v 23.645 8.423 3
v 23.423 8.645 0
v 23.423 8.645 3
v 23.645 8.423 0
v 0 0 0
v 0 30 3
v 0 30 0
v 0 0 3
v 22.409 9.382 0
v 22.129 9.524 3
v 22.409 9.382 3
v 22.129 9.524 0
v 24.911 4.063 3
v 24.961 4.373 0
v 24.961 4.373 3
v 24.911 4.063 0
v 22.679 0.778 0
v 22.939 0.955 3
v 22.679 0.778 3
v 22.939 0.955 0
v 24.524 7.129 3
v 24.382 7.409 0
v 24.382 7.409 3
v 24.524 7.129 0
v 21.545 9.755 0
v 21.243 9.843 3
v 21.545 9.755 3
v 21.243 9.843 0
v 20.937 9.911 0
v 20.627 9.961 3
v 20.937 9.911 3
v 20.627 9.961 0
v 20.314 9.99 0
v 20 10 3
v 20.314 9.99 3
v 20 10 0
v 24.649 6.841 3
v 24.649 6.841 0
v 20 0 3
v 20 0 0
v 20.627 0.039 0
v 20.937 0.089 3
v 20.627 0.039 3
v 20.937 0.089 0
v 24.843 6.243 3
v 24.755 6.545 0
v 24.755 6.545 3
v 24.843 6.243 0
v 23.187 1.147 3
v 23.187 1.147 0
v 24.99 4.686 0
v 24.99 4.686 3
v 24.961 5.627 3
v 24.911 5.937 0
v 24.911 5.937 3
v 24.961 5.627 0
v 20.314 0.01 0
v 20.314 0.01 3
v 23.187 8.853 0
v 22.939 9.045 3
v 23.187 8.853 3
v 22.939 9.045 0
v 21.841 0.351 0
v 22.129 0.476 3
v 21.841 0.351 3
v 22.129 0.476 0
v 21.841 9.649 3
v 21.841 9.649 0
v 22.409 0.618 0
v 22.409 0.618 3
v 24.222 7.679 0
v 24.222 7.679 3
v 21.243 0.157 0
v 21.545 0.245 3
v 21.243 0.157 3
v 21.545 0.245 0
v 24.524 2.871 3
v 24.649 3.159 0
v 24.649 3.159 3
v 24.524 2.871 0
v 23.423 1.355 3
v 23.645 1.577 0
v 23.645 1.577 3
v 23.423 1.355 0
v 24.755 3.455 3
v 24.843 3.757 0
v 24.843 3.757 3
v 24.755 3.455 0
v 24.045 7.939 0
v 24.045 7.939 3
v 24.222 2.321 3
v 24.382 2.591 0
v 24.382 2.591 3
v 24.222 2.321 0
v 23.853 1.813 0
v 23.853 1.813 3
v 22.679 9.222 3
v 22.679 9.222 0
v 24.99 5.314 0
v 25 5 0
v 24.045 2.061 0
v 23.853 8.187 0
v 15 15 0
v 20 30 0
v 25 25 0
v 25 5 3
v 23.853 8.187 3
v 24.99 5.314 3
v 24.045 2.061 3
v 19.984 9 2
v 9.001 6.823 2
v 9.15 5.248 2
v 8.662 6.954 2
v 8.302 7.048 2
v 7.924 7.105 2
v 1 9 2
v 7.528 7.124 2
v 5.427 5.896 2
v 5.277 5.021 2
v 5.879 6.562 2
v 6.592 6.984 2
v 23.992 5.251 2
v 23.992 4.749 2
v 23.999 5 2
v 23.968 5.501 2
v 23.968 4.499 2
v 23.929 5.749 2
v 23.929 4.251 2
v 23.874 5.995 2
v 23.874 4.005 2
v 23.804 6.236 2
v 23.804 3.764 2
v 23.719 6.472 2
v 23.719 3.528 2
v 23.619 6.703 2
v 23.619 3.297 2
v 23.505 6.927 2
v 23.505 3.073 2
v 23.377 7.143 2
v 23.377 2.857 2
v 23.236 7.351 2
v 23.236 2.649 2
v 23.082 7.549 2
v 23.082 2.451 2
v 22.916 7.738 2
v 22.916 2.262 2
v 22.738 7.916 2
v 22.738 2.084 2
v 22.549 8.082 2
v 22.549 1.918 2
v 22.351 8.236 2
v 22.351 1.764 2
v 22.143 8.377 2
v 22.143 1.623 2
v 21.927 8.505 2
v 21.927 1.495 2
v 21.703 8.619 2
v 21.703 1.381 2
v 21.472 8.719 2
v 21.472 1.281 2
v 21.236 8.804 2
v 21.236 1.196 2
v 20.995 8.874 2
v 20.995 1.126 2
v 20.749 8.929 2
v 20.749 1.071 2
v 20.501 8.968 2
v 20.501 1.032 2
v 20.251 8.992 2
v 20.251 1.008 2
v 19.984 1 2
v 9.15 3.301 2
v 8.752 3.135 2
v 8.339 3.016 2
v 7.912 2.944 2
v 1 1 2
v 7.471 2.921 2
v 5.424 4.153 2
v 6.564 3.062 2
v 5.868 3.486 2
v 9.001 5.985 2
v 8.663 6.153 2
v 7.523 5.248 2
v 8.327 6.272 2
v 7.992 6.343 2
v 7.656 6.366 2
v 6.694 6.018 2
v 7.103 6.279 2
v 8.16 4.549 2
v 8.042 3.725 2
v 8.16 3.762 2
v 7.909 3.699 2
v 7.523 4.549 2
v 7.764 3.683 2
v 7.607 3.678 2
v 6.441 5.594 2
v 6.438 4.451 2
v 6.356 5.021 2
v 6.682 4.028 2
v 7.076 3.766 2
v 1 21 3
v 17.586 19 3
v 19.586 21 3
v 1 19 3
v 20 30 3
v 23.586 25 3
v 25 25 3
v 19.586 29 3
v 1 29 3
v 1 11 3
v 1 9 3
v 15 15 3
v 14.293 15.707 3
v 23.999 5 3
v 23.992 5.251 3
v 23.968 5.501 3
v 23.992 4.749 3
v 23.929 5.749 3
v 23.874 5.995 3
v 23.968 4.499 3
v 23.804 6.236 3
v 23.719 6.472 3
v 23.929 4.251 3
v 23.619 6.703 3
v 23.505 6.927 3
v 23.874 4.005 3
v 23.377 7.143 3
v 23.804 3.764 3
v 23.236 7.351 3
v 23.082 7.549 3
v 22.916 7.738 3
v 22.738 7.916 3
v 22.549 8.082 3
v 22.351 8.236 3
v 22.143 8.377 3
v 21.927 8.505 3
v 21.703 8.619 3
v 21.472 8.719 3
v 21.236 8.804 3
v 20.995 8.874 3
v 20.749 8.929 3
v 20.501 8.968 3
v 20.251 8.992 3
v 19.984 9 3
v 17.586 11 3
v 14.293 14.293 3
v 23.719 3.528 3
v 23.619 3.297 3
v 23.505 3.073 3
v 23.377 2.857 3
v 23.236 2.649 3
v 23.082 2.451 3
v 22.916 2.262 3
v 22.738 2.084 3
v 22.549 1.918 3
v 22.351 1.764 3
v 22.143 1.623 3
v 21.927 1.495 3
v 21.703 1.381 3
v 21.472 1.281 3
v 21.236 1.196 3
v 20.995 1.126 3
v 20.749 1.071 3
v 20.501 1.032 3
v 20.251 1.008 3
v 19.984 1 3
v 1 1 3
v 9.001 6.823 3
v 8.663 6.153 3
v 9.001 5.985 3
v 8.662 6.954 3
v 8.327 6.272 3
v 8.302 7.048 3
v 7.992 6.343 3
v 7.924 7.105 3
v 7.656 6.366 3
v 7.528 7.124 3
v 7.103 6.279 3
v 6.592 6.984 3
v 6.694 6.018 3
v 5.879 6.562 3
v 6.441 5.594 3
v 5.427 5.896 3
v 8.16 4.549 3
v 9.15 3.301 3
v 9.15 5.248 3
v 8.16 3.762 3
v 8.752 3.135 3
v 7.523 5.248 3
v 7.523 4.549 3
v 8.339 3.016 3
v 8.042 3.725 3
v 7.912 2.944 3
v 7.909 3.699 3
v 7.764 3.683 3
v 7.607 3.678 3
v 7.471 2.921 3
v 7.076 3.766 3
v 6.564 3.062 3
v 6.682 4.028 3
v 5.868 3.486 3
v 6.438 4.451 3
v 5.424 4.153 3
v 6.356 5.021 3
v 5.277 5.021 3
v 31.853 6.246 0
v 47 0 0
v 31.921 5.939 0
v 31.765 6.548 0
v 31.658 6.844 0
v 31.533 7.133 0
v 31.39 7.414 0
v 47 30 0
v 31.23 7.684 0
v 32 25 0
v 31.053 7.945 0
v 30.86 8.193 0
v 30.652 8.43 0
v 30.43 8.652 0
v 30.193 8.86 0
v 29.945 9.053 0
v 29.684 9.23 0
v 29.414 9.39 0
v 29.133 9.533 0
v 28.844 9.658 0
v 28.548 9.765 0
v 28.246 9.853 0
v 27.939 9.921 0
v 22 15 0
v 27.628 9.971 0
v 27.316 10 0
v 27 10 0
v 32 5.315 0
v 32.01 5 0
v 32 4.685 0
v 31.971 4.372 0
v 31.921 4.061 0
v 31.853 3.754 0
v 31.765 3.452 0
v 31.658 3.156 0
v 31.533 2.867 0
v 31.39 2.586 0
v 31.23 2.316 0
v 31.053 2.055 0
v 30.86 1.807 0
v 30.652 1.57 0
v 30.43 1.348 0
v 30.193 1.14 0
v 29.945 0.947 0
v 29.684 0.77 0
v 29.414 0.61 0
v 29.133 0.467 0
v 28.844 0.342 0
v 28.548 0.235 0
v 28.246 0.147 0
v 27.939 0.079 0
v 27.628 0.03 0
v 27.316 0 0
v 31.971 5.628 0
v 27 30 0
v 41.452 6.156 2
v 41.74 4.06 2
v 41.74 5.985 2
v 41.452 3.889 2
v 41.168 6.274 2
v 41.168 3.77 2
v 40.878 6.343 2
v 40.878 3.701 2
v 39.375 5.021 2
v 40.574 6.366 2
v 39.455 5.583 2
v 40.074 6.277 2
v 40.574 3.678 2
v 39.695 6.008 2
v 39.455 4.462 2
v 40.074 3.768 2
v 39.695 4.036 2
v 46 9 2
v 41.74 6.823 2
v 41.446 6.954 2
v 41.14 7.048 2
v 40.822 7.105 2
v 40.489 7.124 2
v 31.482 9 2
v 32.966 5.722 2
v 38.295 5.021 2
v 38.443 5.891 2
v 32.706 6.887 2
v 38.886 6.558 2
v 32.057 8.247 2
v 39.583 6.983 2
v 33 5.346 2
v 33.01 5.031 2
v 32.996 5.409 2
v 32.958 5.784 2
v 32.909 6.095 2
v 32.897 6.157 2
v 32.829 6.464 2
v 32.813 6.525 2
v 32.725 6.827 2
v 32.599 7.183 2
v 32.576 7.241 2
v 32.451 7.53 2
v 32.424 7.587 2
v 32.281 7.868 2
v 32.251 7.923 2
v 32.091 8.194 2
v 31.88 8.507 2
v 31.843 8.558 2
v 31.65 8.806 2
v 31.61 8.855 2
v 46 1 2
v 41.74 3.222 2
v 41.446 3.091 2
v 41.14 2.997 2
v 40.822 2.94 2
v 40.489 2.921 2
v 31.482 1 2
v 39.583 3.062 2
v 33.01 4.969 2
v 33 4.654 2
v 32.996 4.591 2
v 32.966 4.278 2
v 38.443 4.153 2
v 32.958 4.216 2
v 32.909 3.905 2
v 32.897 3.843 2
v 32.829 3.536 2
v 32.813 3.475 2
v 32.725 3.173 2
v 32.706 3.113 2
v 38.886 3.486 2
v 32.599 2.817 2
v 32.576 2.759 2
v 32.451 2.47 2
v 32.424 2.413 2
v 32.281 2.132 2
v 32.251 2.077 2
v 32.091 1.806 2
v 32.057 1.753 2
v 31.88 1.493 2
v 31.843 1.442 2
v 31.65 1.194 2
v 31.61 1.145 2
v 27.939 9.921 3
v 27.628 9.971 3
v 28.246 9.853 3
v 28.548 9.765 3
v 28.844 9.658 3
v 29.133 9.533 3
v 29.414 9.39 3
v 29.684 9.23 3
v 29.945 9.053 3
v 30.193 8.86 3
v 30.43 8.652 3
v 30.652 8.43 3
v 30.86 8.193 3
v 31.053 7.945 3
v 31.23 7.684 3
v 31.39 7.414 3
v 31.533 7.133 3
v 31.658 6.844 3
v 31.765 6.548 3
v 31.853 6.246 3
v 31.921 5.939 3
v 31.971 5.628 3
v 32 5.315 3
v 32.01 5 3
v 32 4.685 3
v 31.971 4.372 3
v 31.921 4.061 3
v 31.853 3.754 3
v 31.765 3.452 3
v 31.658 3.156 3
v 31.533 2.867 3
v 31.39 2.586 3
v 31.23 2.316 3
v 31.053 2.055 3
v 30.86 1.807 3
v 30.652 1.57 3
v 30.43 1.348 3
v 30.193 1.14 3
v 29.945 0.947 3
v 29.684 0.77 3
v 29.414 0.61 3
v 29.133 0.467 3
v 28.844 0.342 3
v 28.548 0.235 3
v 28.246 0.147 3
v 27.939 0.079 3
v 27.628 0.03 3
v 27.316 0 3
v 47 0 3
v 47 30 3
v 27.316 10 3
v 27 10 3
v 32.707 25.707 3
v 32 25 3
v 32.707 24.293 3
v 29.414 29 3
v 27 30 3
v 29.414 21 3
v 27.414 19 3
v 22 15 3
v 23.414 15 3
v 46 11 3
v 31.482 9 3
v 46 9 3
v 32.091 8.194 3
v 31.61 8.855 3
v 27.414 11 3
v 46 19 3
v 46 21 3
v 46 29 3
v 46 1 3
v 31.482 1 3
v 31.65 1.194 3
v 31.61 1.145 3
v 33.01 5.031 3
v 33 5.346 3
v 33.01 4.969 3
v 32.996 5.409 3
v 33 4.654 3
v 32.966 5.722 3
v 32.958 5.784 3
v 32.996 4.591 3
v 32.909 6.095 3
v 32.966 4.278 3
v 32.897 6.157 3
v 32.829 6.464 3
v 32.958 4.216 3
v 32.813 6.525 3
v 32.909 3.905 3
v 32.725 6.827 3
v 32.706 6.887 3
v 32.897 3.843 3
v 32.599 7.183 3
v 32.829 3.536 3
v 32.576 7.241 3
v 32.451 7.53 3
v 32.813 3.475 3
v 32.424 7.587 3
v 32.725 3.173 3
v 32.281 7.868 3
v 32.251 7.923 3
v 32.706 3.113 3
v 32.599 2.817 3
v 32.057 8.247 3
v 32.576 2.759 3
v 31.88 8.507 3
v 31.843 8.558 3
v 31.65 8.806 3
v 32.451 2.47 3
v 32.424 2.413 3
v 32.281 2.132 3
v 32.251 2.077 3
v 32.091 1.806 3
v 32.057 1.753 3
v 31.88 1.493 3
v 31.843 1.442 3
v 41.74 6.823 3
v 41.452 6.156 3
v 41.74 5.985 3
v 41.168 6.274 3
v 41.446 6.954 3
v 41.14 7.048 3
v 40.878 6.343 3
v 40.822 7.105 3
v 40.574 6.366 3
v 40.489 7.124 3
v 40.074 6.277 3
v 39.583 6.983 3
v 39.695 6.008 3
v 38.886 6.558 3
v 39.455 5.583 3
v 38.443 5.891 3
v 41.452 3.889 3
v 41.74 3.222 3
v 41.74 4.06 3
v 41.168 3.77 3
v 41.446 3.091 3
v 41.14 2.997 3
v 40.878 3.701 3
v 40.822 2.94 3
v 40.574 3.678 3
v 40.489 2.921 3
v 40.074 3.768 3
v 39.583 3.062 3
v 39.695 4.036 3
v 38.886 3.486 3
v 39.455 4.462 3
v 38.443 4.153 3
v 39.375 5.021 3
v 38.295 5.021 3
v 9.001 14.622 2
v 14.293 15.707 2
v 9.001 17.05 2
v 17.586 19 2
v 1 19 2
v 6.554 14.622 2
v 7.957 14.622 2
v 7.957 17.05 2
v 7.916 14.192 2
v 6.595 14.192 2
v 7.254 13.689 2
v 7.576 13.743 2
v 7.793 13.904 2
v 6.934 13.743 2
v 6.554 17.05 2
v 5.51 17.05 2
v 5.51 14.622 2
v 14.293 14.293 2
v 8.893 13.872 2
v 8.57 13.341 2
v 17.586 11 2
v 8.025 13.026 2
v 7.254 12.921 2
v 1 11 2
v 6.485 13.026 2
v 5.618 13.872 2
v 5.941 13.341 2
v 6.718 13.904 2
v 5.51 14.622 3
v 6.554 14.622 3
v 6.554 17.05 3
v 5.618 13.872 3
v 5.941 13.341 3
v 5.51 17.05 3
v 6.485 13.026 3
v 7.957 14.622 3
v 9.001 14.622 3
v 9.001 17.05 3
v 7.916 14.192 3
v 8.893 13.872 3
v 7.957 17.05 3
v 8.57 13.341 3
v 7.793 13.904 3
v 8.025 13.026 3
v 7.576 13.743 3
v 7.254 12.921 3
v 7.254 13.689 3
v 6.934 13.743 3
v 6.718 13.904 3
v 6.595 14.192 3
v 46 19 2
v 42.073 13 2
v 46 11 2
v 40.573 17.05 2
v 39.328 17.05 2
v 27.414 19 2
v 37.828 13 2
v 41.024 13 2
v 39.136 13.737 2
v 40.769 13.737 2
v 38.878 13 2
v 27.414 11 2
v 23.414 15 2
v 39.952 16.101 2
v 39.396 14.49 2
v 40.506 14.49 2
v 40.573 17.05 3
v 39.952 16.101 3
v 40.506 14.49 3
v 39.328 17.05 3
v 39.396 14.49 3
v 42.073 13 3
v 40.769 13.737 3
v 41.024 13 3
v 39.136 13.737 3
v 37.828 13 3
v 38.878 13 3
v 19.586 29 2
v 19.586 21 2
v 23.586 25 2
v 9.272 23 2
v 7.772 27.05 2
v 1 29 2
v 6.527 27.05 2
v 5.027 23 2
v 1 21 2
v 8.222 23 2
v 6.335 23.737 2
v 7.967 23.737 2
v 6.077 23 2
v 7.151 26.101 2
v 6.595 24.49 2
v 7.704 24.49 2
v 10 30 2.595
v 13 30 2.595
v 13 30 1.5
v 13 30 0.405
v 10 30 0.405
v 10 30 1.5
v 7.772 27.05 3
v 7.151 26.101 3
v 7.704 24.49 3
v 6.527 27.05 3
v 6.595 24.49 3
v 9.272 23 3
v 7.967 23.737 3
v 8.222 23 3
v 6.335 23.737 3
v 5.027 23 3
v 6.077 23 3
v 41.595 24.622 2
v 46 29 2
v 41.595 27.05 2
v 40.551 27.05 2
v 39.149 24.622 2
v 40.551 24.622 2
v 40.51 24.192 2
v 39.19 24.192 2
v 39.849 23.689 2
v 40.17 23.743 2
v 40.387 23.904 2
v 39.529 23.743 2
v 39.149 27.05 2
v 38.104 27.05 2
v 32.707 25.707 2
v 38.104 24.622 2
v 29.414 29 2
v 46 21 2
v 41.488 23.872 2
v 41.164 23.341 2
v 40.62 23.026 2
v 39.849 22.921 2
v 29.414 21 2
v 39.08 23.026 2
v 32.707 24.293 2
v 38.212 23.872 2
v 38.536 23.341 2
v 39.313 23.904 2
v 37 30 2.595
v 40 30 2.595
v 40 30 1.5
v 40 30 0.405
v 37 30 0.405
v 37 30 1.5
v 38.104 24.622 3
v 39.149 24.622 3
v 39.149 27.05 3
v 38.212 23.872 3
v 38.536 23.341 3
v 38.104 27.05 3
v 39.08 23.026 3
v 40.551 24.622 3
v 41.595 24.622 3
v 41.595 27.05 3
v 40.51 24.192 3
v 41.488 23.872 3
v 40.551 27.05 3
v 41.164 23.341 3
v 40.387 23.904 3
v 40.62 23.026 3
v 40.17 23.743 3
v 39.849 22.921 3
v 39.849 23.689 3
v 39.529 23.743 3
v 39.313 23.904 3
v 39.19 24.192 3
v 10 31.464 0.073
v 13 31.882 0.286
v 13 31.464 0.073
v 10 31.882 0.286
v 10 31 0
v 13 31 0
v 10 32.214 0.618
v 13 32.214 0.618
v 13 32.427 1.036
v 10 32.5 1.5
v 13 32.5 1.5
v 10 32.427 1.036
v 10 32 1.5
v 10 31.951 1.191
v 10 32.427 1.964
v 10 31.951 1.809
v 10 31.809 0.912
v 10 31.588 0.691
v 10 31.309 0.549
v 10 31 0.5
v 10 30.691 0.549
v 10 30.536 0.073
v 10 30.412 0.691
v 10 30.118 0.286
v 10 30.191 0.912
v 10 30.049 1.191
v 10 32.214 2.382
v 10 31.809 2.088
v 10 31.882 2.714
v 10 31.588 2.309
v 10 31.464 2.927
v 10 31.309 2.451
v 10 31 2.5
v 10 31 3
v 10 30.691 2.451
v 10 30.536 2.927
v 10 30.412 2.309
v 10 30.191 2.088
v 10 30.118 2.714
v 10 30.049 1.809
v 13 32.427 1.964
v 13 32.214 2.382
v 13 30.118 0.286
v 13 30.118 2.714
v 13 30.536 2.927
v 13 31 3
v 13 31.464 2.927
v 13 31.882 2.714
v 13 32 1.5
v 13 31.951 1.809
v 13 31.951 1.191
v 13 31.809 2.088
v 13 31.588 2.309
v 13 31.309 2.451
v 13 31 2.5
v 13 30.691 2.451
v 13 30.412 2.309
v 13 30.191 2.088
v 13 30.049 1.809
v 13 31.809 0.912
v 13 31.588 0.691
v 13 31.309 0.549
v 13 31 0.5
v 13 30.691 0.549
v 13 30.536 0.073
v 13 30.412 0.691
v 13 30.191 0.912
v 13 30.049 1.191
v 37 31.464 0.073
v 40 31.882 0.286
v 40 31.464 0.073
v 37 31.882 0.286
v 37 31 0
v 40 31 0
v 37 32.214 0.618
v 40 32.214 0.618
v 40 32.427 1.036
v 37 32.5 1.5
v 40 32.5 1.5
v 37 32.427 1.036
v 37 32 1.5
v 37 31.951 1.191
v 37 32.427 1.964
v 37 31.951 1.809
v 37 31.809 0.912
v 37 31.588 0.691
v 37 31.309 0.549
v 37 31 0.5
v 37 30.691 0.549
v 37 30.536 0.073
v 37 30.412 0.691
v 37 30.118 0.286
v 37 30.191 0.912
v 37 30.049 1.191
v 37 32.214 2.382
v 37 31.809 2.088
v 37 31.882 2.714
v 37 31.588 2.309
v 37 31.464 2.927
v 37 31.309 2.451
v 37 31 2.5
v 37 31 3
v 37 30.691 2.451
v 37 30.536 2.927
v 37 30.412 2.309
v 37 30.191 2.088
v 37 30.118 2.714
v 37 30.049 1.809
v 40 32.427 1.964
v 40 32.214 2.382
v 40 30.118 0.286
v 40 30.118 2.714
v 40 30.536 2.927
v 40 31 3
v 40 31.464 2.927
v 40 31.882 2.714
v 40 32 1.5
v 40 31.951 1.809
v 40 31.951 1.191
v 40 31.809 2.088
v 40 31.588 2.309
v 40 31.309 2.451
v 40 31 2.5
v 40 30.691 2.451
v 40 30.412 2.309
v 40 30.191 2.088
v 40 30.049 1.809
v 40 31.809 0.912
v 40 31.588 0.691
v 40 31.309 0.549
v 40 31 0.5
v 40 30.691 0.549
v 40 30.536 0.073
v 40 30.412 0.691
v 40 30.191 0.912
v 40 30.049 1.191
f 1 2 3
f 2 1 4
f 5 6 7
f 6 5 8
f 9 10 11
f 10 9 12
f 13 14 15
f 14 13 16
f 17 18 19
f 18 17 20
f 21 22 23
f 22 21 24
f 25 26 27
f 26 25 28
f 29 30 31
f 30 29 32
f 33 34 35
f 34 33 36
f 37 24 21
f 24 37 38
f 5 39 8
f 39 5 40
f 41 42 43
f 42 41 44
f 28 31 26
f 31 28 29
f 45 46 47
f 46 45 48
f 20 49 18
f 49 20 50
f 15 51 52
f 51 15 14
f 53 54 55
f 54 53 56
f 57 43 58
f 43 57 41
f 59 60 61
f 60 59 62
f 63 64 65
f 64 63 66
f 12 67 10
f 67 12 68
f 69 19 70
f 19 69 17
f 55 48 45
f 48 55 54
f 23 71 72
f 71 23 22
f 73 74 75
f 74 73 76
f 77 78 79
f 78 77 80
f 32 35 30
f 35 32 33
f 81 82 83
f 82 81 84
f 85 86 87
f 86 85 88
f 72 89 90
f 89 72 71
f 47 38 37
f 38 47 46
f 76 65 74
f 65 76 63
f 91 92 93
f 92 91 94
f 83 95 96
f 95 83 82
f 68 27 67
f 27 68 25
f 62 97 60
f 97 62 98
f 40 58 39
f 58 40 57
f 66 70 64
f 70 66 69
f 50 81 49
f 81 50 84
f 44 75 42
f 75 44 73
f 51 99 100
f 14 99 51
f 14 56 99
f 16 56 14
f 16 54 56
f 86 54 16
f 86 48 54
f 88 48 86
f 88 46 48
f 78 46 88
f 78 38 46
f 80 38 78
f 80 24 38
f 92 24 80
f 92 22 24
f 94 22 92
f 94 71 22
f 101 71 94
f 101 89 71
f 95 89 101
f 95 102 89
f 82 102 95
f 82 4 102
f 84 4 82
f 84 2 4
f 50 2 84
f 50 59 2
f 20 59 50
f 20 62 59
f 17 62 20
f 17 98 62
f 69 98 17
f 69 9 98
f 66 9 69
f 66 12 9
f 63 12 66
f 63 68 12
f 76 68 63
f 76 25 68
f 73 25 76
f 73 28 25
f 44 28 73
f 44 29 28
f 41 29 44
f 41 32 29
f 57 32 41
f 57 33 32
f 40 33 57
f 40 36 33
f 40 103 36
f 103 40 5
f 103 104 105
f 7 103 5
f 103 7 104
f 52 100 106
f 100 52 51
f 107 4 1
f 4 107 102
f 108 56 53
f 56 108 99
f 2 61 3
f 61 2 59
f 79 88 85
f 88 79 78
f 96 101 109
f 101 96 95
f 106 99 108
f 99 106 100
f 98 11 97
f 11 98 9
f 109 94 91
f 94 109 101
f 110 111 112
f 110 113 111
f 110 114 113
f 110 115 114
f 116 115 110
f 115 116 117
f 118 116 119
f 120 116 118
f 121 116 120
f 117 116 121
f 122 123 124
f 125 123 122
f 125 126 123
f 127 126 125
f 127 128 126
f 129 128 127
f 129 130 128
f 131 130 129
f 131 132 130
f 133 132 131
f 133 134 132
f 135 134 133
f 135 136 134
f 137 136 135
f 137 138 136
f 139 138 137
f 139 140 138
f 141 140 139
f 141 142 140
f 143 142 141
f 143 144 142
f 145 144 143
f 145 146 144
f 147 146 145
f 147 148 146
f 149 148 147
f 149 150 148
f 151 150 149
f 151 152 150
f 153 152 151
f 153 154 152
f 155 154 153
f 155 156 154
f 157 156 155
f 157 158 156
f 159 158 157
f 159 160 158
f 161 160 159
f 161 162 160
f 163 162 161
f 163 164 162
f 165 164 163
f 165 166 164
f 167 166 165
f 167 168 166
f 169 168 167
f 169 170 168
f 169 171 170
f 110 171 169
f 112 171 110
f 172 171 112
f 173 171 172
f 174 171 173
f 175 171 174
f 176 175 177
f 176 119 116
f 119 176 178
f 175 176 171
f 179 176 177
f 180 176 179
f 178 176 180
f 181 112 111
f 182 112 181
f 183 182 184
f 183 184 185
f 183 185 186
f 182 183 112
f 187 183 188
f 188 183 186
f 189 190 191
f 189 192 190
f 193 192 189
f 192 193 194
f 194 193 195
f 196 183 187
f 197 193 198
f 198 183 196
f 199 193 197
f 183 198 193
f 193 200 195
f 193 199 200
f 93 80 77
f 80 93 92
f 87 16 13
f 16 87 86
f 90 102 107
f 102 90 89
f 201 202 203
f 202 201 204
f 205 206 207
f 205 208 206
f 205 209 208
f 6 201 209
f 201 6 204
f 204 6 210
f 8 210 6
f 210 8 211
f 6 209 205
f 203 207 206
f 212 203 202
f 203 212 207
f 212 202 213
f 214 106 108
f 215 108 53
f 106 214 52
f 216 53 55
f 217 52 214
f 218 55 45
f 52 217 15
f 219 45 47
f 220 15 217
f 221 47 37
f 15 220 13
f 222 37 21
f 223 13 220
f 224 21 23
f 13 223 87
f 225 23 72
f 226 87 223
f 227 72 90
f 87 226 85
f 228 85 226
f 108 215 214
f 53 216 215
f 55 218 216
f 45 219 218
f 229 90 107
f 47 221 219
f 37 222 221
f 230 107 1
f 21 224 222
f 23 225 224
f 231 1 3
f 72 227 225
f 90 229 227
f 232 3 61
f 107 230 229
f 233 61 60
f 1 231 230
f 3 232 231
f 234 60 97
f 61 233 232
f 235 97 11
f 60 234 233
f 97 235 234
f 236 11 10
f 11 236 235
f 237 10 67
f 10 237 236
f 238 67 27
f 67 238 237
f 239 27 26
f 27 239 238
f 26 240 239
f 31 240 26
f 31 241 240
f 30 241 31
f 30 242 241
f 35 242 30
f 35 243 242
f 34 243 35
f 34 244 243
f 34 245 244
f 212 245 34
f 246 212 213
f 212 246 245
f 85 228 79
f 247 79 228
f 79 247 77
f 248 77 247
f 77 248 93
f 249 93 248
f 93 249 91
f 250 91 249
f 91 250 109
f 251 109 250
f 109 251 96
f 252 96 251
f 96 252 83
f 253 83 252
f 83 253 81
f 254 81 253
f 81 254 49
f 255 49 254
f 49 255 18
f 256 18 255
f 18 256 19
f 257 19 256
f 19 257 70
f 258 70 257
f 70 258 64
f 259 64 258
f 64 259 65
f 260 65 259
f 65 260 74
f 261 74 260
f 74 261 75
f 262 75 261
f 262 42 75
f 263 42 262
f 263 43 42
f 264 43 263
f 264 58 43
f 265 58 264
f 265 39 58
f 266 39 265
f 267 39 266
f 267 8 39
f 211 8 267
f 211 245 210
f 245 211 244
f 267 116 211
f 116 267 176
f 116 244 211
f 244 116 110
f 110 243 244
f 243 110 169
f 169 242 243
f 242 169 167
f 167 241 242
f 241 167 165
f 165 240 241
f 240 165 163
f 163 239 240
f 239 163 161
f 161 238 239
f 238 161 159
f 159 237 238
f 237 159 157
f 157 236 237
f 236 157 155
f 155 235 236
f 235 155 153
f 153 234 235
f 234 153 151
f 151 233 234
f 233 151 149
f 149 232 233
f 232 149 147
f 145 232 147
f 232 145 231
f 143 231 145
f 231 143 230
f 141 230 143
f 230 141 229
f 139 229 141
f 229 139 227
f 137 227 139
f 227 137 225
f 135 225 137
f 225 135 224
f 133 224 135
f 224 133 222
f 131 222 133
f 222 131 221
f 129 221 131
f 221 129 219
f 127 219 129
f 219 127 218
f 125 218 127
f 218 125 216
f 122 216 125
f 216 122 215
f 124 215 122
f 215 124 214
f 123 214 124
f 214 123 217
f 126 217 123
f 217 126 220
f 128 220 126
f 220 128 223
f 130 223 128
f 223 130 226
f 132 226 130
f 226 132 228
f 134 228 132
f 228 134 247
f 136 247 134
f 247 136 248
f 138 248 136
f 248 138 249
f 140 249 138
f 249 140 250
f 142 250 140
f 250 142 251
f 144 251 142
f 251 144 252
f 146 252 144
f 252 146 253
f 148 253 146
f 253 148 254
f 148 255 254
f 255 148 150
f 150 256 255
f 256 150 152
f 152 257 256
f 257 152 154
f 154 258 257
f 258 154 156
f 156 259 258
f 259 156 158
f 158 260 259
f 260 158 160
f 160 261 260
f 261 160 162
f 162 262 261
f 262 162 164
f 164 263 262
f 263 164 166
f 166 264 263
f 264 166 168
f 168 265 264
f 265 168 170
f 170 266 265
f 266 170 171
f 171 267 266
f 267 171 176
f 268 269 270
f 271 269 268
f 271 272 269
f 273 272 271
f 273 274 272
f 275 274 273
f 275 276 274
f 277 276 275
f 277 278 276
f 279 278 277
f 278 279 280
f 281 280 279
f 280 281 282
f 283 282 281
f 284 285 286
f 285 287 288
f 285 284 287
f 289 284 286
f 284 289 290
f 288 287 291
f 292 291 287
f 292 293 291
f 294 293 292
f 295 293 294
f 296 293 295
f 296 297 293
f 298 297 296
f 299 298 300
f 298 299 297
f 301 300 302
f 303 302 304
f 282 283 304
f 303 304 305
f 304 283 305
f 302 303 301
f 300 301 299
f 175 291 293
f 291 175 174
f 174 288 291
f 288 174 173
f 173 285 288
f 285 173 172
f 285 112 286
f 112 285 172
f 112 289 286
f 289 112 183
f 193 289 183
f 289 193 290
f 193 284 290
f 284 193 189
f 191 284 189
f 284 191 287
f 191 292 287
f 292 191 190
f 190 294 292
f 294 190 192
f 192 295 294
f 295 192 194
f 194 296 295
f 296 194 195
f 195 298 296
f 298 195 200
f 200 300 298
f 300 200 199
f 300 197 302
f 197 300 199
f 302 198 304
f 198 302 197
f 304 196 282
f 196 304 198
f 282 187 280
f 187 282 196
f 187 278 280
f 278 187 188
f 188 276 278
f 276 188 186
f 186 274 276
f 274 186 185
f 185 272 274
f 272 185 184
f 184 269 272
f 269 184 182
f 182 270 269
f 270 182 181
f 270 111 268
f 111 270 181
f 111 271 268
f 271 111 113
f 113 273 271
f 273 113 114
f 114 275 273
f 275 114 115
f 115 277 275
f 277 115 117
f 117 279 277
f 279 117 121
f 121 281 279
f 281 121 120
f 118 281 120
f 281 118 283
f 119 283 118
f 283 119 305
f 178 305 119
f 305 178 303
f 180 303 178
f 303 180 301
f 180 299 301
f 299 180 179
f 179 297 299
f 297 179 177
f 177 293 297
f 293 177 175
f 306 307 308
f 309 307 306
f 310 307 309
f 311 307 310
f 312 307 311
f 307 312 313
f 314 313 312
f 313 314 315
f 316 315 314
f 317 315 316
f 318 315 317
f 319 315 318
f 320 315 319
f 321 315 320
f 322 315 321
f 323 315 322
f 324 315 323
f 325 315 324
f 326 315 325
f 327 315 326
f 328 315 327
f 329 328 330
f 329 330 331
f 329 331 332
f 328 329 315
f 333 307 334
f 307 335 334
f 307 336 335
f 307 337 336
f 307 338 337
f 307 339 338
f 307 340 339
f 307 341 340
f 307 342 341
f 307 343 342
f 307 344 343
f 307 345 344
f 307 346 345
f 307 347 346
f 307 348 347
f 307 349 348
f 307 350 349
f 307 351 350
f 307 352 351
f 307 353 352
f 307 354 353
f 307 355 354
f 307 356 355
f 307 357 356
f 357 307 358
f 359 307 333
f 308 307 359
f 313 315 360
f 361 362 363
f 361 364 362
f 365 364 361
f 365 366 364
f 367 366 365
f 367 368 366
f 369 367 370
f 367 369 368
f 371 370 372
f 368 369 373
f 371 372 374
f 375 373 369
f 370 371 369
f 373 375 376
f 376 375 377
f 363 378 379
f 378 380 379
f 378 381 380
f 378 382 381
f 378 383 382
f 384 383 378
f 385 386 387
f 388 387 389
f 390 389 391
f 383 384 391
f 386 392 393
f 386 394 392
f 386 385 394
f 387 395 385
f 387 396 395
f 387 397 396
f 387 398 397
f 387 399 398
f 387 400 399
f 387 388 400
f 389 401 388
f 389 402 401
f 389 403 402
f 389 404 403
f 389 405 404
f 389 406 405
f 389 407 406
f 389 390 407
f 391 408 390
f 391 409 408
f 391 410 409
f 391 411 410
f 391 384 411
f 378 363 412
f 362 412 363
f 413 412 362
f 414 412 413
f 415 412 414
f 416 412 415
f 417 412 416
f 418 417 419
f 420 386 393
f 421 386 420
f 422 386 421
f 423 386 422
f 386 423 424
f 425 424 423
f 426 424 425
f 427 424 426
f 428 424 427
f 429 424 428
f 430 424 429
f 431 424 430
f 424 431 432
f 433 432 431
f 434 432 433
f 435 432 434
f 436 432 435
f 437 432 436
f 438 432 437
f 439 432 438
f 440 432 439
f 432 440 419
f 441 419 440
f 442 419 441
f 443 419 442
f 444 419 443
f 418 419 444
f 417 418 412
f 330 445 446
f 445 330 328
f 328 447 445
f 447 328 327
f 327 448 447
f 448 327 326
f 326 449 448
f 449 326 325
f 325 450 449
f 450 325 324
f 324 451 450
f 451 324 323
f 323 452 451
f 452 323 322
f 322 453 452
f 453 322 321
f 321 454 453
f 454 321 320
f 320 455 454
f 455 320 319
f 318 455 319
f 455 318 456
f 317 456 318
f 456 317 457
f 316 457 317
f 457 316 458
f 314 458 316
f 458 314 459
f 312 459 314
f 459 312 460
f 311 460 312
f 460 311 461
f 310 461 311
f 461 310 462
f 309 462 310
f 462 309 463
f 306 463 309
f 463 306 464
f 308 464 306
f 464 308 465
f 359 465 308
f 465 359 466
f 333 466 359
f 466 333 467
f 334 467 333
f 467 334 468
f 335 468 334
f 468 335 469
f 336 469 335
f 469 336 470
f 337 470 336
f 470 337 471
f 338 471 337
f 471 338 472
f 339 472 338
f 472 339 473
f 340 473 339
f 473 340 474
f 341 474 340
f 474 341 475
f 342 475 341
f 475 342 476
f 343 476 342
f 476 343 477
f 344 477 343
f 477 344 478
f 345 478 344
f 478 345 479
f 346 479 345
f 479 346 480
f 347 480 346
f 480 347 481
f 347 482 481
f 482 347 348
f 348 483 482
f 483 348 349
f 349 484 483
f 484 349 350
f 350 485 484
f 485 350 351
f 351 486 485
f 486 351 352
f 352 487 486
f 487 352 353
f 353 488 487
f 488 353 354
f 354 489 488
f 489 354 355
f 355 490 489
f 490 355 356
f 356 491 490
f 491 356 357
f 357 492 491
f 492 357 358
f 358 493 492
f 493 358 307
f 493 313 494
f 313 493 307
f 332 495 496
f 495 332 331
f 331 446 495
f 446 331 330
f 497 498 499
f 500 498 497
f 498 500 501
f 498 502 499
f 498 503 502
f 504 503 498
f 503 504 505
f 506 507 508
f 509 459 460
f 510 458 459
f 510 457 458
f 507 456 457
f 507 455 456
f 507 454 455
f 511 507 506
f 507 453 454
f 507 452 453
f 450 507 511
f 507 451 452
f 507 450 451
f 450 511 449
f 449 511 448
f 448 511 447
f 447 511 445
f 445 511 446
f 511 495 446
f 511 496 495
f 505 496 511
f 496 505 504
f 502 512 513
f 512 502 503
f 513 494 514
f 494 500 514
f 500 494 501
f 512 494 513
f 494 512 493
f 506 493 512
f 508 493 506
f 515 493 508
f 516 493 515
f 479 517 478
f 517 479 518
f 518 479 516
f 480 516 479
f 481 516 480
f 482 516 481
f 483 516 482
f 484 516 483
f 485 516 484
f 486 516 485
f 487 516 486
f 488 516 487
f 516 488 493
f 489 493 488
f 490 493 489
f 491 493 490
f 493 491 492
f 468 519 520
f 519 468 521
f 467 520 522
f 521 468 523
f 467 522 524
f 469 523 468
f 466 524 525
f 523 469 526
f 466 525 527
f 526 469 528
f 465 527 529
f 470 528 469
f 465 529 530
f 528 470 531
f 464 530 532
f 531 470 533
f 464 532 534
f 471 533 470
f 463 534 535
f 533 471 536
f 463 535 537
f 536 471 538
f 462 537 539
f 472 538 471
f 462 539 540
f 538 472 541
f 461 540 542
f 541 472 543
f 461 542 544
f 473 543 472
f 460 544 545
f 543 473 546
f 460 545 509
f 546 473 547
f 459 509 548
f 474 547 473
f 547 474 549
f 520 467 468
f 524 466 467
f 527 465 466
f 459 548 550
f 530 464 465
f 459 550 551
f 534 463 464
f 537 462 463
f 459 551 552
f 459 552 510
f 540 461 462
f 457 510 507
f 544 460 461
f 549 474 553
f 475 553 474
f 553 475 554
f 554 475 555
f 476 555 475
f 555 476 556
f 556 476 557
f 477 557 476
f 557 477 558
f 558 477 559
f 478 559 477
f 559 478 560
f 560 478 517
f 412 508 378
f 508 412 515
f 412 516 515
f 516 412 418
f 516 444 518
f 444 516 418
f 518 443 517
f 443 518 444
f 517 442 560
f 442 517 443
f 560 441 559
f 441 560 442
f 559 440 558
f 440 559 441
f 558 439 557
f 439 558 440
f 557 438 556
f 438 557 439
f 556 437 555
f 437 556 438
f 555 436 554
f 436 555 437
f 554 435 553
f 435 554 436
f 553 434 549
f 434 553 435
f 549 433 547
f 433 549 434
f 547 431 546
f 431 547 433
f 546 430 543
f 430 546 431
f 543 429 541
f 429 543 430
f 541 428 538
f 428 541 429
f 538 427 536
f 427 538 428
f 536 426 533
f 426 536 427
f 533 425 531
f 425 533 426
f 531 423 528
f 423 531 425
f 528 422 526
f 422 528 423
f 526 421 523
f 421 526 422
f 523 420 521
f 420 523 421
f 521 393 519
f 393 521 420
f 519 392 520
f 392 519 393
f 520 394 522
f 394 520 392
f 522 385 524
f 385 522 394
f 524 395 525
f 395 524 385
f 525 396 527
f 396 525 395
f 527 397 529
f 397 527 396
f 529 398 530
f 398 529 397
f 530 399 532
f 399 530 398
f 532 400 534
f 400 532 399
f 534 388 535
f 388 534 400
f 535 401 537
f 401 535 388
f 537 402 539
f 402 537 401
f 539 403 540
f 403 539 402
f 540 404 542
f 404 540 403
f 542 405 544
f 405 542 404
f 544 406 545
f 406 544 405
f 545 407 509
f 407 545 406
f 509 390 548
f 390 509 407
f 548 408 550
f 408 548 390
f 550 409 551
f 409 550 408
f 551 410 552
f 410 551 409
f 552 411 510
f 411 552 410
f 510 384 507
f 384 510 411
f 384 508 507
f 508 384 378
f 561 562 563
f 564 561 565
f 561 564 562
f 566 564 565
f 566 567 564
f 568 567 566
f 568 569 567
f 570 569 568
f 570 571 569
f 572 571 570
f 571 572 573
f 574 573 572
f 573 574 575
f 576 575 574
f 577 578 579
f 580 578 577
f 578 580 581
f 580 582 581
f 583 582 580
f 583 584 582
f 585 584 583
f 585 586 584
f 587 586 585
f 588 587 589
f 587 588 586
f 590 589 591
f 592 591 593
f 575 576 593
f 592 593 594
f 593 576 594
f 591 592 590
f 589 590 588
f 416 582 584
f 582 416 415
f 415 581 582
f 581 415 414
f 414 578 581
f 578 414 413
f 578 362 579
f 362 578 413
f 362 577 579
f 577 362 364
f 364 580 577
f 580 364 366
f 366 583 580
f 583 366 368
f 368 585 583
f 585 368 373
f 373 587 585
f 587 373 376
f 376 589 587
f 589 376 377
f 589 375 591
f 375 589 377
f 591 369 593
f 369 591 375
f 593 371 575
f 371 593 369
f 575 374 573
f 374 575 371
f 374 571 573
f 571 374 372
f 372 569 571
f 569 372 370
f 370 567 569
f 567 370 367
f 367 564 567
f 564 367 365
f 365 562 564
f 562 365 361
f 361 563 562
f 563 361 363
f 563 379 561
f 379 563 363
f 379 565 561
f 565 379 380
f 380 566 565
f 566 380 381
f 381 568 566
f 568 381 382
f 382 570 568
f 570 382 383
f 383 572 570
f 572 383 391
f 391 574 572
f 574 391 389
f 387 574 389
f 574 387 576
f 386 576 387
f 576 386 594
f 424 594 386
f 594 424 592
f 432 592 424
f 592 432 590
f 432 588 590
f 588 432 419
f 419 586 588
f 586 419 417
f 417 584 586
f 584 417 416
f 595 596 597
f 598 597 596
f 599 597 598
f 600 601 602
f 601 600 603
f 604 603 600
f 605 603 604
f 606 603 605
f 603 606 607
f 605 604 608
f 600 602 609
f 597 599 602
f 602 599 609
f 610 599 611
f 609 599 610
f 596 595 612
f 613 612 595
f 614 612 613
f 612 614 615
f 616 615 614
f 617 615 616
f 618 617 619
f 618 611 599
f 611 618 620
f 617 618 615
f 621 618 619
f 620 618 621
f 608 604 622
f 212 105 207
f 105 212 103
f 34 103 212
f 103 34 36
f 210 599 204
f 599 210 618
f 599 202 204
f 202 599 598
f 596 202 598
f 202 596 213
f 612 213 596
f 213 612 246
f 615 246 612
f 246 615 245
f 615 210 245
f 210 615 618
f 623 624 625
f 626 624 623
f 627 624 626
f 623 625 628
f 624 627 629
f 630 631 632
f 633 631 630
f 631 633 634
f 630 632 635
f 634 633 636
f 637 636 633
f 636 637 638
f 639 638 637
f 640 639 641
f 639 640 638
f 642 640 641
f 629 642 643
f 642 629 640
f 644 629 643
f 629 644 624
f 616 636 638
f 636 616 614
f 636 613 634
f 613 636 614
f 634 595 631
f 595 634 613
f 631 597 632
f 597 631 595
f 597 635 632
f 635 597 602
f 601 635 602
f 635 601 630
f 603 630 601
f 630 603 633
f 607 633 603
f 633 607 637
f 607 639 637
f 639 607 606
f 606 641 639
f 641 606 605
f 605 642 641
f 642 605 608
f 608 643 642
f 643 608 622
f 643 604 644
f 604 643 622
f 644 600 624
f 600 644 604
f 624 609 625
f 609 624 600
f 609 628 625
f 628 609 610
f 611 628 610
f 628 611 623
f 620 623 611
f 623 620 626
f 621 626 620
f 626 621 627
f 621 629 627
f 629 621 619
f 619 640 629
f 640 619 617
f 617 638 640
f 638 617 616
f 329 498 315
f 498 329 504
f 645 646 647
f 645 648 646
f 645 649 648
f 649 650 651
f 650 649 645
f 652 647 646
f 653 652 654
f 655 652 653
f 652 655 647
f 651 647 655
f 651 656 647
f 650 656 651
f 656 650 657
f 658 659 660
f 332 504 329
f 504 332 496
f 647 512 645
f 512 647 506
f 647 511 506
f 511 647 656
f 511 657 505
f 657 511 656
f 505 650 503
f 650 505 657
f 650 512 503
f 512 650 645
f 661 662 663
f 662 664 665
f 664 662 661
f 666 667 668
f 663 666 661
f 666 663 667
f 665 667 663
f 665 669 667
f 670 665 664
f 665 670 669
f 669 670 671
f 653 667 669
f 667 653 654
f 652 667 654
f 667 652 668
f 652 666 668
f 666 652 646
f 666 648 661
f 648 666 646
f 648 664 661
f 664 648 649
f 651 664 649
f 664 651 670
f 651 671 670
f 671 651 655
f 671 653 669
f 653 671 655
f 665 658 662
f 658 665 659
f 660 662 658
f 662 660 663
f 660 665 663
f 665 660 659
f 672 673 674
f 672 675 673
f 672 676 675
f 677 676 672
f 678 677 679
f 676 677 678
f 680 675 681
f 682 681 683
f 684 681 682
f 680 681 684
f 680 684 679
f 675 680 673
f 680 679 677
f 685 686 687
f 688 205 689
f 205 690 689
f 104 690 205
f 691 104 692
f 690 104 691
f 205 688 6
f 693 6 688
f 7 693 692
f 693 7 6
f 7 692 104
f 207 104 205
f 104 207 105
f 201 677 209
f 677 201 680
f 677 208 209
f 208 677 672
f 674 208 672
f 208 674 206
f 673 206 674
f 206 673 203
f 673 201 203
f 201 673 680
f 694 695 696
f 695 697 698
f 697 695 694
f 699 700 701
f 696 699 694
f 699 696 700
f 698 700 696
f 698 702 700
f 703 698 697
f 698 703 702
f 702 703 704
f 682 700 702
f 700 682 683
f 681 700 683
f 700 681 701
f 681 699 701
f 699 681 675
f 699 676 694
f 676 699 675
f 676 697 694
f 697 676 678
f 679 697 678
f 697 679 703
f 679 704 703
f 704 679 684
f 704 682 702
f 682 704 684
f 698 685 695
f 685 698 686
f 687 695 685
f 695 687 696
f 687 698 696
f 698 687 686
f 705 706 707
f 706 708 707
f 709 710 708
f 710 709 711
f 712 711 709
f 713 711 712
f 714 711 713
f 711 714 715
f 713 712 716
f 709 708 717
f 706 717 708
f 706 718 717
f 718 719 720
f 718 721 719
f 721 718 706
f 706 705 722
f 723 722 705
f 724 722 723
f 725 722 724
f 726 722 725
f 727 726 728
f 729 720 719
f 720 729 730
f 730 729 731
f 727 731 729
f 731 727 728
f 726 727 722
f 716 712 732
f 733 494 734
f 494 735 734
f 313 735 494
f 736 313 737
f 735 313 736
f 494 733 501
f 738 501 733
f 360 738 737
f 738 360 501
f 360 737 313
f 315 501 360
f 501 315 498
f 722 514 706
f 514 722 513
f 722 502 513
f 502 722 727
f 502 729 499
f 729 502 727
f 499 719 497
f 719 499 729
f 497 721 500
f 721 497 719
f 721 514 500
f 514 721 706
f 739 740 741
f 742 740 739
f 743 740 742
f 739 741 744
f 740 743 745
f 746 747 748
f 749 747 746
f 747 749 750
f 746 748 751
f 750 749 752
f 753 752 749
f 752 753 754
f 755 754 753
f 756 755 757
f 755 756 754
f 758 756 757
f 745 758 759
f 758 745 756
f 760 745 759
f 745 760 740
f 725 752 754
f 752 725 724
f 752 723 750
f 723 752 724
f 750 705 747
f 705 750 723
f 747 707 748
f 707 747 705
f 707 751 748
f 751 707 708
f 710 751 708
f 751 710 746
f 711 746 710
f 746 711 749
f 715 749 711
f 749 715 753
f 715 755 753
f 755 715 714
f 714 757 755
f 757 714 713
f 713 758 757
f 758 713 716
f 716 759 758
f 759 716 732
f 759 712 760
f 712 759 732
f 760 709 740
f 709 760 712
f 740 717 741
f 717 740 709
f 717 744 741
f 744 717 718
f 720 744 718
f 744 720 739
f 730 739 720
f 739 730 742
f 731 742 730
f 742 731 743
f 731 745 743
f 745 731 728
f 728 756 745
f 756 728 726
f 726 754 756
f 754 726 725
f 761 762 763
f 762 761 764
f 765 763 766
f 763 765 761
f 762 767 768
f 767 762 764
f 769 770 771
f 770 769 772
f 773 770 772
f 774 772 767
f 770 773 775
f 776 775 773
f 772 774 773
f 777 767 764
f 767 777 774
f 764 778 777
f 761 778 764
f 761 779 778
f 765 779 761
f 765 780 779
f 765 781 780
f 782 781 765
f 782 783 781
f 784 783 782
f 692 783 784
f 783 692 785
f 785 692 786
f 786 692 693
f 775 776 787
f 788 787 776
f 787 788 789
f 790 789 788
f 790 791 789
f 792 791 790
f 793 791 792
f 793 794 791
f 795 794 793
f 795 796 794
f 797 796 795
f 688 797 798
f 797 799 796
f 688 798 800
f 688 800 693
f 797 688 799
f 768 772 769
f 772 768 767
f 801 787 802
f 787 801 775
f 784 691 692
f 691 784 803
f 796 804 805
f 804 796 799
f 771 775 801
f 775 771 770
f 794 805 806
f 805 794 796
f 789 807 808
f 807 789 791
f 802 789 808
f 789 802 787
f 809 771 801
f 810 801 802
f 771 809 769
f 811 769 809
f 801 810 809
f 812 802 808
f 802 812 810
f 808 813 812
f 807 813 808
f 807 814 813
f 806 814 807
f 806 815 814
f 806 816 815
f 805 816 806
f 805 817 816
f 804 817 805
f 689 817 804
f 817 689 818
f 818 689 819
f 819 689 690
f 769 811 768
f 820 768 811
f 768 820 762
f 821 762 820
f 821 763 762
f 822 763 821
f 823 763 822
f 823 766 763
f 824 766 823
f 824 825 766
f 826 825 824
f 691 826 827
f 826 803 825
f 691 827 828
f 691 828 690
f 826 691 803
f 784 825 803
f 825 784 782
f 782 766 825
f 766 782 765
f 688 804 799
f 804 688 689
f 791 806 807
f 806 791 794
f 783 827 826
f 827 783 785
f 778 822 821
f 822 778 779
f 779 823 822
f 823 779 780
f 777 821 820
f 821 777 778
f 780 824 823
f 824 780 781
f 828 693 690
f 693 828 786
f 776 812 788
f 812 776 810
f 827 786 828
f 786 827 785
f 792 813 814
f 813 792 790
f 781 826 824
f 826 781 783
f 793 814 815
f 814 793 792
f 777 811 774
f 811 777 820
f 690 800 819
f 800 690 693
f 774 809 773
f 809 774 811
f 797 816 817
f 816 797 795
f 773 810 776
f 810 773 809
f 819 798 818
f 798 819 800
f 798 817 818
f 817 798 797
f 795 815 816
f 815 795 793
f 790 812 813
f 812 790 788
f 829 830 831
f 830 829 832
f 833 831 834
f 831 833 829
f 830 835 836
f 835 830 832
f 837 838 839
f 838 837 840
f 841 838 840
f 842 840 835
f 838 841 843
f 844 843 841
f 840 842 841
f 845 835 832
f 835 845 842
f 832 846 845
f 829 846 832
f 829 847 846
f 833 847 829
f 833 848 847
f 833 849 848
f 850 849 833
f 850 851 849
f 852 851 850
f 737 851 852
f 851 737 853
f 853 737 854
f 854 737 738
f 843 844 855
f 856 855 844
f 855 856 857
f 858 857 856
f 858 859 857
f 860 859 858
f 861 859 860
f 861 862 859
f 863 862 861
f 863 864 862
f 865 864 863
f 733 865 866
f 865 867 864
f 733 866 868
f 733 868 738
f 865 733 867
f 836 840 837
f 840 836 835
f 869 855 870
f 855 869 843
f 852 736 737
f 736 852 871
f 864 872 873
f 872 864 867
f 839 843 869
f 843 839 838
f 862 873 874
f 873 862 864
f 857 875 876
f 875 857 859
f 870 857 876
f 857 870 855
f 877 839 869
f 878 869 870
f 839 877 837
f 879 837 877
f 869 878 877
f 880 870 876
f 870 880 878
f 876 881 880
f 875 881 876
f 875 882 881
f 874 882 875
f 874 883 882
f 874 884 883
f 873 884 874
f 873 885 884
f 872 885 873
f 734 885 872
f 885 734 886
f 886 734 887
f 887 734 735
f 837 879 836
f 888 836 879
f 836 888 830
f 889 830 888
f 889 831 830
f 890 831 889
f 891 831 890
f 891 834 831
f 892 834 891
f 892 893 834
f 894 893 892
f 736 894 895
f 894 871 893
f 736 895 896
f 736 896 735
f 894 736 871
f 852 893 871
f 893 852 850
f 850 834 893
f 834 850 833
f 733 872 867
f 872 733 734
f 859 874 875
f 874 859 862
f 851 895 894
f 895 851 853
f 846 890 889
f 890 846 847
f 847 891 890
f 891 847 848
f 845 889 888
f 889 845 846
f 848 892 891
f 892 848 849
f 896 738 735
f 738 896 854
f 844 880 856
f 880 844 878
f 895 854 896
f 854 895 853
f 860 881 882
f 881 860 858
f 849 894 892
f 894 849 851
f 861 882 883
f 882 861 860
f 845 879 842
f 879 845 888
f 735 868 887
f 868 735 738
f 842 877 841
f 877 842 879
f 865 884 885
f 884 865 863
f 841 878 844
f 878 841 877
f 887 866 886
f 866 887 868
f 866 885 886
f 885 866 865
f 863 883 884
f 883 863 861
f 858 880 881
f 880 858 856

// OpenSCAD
width = 20;
height = 10;
extrusion = height / 2;
separation = 7;
textHeightCoeff = .4;
textXoffset = 5;
radiusFudge = 0.01;


//https://gist.github.com/Stemer114/7e420ea8ad9733c4e0ba
module ring(
        h=1,
        od = 10,
        id = 5,
        de = 0.1
        ) 
{
    difference() {
        cylinder(h=h, r=od/2, $fn=20);
        translate([0, 0, -de])
            cylinder(h=h+2*de, r=id/2, $fn=20);
    }
}


module drawLabel(x, y, isRotated, string){
    offsetY = (height * (1 - textHeightCoeff) / 2);
    linear_extrude(3){
        translate([x + (isRotated ? (width*2) - textXoffset : textXoffset), y + offsetY]){
            text(text=string, size=(height * textHeightCoeff), font="Muli:style=Bold", halign=(isRotated ? "right" : "left"));
        }
    }
}
module drawPolygon(x, y, isRotated, vertices){
    if(isRotated){
        x = x * -1;
        y = y * -1;
    }
    translate([x + (isRotated ? width*2 : 0), y + (isRotated ? height : 0), 0]){
        rotate(isRotated ? 180 : 0){
            linear_extrude(height = 2) polygon(vertices);
            linear_extrude(height = 3) {
                difference() {
                    offset(0) polygon(vertices);
                    offset(-1) polygon(vertices);
                }
            }
        }
    }
}
module drawA(x, y, isRotated) {
    y = y * height;
    drawLabel(x, y, isRotated, "A");
    vertices = [[0, 0], [0, height], [width, height], [width + extrusion, height / 2], [width, 0]];
    drawPolygon(x, y, isRotated, vertices);
};
module drawT(x, y, isRotated, useRNAencoding = false) {
    y = y * height;
    drawLabel(x, y, isRotated, useRNAencoding ? "U" : "T");
    vertices = [[0, 0], [0, height], [width, height], [width - extrusion, height / 2], [width, 0]];
    drawPolygon(x, y, isRotated, vertices);
};

module G(vertices) union(){
    translate([width, height / 2, 0]) circle(height / 2, $fn = 100);
    polygon(vertices);
}

module drawG(x, y, isRotated) {
    y = y * height;
    drawLabel(x, y, isRotated, "G");
    translate([x + (isRotated ? width*2 : 0), y + (isRotated ? height : 0), 0]){
        rotate(isRotated ? 180 : 0){
            vertices = [[0, 0], [0, height], [width, height], [width, 0]];
            linear_extrude(height = 2) G(vertices);
            linear_extrude(height = 3) {
                difference() {
                    offset(0) G(vertices);
                    offset(-1) G(vertices);
                }
            }
        }
    }
};

module C(vertices) difference(){
    polygon(vertices);
    translate([width, height / 2, 0]) circle((height / 2) + radiusFudge, $fn = 100);
}

module drawC(x, y, isRotated) {
    y = y * height;
    drawLabel(x, y, isRotated, "C");
    translate([x + (isRotated ? width*2 : 0), y + (isRotated ? height : 0), 0]){
        rotate(isRotated ? 180 : 0){
            vertices = [[0, 0], [0, height], [width, height], [width, 0]];
            linear_extrude(height = 2) C(vertices);
            linear_extrude(height = 3) {
                difference() {
                    offset(0) C(vertices);
                    offset(-1) C(vertices);
                }
            }
        }
    }
};

rna = true;
sequence = "AUG";

for(i = [0 : len(sequence)]){
    base = sequence[len(sequence) - i - 1];
    if(base == "A"){
        drawA(0, i, false);
        drawT(separation, i, true, rna);
    }
    if(base == "T" || base == "U"){
        drawT(0, i, false, base == "U");
        drawA(separation, i, true);
    }
    if(base == "C"){
        drawC(0, i, false);
        drawG(separation, i, true);
    }
    if(base == "G"){
        drawG(0, i, false);
        drawC(separation, i, true);
    }
    
}

translate([width / 2, (height * len(sequence)) + 1, 1.5]) rotate([0, 90, 0]) ring(h=3, id=2, od=3, de=.01);
translate([(width / 2) + separation + width, (height * len(sequence)) + 1, 1.5]) rotate([0, 90, 0]) ring(h=3, id=2, od=3, de=.01);
